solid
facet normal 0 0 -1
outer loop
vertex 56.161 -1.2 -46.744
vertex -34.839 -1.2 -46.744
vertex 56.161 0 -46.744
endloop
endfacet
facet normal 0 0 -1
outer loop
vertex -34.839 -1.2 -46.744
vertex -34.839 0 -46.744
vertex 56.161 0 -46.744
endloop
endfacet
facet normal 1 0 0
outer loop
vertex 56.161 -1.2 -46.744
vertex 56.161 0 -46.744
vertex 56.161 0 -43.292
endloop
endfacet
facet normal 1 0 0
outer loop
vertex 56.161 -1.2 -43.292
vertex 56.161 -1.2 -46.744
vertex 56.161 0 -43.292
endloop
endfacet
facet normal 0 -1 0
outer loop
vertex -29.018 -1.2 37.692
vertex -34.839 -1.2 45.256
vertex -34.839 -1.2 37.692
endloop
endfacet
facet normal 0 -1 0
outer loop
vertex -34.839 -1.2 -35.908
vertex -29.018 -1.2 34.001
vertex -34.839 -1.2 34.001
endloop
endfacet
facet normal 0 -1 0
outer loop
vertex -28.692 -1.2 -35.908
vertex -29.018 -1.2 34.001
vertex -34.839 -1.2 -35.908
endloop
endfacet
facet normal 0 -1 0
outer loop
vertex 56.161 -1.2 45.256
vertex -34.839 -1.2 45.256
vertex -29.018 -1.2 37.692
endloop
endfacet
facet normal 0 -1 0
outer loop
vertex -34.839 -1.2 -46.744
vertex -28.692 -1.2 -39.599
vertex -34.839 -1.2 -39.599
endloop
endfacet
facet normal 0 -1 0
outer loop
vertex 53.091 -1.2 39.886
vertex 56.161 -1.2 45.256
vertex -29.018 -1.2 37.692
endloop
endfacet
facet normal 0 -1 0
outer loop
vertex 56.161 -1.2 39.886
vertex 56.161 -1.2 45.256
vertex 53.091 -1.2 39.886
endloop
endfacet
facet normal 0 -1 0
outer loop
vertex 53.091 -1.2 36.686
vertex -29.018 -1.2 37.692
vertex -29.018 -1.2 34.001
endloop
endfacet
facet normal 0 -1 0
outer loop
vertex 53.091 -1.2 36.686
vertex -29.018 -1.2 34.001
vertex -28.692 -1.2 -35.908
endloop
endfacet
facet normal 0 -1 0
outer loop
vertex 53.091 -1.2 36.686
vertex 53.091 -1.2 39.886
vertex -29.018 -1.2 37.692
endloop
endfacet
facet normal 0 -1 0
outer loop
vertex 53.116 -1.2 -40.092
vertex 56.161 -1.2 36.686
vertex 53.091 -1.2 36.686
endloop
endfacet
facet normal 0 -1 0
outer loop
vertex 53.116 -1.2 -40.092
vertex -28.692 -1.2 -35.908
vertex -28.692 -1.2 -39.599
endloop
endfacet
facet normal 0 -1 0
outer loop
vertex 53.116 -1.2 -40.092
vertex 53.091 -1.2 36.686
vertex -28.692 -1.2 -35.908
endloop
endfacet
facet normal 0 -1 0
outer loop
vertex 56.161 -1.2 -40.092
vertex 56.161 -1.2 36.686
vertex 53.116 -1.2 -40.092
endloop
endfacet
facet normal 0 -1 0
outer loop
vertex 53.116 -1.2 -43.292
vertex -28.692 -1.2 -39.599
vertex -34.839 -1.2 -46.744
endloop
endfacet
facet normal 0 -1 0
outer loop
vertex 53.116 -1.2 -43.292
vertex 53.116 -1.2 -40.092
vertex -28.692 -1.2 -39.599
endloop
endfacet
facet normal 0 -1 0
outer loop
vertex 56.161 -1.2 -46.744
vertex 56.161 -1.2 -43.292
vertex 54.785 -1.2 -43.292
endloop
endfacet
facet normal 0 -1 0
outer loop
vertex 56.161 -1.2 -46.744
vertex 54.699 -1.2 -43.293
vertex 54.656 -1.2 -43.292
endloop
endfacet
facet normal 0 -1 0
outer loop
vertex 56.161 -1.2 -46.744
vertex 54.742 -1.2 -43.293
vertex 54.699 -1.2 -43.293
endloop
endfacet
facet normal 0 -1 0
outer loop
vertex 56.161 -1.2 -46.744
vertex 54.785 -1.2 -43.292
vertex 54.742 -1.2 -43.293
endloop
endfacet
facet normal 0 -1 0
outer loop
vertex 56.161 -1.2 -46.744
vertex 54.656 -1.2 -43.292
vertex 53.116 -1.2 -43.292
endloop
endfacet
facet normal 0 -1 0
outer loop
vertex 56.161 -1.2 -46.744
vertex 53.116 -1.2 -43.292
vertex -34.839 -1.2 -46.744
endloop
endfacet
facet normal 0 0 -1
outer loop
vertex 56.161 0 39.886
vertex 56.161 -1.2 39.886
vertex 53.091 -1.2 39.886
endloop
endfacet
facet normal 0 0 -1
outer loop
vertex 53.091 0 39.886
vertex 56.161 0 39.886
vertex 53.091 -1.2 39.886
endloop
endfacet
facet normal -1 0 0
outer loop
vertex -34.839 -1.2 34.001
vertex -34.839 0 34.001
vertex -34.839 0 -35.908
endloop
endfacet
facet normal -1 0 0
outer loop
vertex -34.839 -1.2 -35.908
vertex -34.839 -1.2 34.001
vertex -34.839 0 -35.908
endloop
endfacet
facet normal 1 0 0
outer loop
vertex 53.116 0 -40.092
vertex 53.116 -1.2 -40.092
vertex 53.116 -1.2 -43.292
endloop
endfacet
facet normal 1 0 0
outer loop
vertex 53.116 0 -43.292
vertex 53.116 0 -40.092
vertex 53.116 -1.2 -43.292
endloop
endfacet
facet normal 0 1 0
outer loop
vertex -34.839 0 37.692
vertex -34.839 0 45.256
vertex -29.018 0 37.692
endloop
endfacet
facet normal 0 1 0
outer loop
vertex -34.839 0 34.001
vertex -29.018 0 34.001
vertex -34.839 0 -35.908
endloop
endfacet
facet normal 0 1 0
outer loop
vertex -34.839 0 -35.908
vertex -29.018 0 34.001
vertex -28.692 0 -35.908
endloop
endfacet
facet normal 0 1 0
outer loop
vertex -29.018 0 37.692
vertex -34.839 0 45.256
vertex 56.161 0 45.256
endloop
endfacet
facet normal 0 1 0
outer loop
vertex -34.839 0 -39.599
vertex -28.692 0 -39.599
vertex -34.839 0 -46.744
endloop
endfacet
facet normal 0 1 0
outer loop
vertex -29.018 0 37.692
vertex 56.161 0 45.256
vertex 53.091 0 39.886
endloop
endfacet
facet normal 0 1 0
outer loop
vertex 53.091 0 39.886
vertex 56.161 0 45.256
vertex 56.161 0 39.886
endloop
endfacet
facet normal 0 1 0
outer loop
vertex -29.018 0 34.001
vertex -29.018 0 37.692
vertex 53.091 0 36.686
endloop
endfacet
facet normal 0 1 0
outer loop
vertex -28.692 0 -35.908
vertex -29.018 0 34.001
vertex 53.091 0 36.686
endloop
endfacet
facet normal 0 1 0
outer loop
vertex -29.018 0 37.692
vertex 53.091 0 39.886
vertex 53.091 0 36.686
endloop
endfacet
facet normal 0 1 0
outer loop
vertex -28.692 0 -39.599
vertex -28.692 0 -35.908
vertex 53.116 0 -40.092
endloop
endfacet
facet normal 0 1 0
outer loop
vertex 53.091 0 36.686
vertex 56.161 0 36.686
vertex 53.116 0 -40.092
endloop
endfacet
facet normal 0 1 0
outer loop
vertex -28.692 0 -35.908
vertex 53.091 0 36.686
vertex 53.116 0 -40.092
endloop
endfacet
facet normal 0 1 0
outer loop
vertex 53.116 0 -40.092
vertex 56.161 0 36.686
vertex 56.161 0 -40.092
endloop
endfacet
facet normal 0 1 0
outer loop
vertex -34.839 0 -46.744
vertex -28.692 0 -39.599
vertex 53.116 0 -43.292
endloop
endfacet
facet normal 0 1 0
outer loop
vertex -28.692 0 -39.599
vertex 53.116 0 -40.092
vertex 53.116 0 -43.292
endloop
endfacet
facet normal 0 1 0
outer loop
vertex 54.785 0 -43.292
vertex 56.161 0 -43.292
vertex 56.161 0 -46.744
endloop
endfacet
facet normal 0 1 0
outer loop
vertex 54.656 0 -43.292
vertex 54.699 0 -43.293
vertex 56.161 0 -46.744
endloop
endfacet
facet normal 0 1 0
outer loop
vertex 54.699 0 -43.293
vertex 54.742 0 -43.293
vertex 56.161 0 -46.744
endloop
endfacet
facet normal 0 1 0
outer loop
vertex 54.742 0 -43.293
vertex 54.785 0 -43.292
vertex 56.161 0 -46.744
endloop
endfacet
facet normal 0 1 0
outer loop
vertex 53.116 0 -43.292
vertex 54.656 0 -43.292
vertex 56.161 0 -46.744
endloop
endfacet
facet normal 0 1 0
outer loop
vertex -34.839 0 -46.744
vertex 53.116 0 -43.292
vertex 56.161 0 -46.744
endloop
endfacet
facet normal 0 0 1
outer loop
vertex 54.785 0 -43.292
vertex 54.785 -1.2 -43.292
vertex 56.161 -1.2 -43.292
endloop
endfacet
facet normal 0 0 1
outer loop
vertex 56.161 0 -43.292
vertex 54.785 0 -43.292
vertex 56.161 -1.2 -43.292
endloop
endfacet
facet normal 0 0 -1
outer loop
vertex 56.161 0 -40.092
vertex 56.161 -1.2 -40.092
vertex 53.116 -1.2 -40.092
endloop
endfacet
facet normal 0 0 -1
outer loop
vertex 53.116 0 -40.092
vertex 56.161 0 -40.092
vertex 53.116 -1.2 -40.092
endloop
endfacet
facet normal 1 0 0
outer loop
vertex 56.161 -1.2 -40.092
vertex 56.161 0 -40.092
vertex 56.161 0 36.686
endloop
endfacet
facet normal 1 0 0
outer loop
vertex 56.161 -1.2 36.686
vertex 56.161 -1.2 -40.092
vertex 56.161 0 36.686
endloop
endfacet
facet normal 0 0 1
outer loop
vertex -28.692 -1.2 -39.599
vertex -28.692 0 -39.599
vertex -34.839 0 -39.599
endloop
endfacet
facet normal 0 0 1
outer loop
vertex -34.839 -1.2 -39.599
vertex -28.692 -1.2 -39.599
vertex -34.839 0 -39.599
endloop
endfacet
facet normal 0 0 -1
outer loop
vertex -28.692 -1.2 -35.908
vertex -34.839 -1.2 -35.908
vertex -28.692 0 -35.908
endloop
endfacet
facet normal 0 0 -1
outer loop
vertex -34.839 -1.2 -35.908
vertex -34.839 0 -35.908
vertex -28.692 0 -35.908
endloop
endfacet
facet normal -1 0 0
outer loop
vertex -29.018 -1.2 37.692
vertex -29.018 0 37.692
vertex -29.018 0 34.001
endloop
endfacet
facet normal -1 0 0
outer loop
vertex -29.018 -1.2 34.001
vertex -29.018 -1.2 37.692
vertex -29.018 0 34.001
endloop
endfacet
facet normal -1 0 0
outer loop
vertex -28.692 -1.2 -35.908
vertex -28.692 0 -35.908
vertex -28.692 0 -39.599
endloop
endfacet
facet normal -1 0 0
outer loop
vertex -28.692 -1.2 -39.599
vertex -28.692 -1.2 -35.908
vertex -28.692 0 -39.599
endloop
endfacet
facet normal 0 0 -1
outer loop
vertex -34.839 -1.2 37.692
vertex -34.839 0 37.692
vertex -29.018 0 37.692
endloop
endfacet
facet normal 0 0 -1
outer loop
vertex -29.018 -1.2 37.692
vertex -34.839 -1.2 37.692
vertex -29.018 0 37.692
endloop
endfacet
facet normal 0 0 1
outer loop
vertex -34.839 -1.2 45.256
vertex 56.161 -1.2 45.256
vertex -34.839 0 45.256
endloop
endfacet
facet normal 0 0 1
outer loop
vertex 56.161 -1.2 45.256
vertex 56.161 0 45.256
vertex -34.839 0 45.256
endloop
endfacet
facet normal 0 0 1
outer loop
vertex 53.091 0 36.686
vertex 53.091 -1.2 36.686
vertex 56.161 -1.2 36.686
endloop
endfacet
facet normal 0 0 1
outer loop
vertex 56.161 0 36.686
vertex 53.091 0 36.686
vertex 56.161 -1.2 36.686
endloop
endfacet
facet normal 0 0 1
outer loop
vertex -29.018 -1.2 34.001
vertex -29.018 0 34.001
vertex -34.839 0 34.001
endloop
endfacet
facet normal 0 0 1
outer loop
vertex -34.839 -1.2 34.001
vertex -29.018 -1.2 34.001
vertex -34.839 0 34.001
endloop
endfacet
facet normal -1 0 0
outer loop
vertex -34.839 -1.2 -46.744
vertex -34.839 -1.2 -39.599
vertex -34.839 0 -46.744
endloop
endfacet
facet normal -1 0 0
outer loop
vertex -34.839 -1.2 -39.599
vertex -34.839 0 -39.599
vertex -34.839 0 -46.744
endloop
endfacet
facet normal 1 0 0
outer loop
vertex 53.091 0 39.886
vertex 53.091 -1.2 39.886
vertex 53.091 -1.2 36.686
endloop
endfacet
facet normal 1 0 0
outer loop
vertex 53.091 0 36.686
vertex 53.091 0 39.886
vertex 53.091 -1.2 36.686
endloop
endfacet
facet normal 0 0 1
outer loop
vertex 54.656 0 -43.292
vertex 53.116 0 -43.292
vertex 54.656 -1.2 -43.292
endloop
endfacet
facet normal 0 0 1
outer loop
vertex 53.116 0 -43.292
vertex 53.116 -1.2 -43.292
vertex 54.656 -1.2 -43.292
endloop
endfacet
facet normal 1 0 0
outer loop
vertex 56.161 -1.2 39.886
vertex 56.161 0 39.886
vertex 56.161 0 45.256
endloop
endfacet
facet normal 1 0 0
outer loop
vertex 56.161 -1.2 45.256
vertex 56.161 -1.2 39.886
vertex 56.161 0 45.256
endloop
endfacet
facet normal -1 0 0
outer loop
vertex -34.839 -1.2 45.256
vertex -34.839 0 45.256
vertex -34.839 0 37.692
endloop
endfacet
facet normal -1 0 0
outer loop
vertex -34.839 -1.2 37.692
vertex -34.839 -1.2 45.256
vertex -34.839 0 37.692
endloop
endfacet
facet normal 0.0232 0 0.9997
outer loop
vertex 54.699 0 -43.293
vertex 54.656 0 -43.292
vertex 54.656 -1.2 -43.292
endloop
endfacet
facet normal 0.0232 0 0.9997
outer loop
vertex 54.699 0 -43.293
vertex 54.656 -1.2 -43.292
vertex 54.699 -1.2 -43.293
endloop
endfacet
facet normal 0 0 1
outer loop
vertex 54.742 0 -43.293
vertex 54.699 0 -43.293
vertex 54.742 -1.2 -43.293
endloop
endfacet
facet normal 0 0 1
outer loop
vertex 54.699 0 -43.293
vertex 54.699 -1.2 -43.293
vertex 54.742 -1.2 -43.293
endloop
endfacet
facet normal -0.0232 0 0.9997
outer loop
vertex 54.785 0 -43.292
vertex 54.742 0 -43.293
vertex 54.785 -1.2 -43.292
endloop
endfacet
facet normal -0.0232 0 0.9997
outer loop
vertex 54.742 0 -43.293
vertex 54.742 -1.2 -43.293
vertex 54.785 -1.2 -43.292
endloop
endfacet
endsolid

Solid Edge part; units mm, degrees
sketch "Sketch1" plane through (12.1606, 0, 0.2565) normal (0, -1, 0) x (1, 0, 0)
  line L0 (-47, -47) -> (44, -47)
  line L1 (44, -47) -> (44, 45)
  line L2 (44, 45) -> (-47, 45)
  line L3 (-47, 45) -> (-47, -47)
  dimension "D1" = 91
  dimension "D2" = 92
extrude "ExtrudedProtrusion_1" add sketch "Sketch1" along normal blind 1.2
sketch "Sketch2" plane through (0, -1.2, 0) normal (0, -1, 0) x (1, 0, 0)
  circle A0 centre (-30.7894, -37.7535) radius 1.59
  circle A1 centre (54.6906, 38.2865) radius 1.59
  circle A2 centre (54.7206, -41.7035) radius 1.59
  circle A3 centre (-31.0894, 35.8465) radius 1.59
  dimension "D1" = 3.18
  dimension "D2" = 3.18
extrude "Cutout1" cut sketch "Sketch2" against normal up to next
sketch "Sketch3" plane through (10.6606, 0, -0.7435) normal (0, 1, 0) x (0, 0, 1)
  line L0 (-41.5487, 42.4559) -> (-42.5487, 42.4559)
  line L1 (-42.5487, 42.4559) -> (-42.5487, 45.6559)
  line L2 (-42.5487, 45.6559) -> (-39.3487, 45.6559)
  line L3 (-39.3487, 45.6559) -> (-39.3487, 42.4559)
  line L4 (-39.3487, 42.4559) -> (-41.5487, 42.4559)
  line L5 (38.43, 42.43) -> (37.43, 42.43)
  line L6 (37.43, 42.43) -> (37.43, 45.63)
  line L7 (37.43, 45.63) -> (40.63, 45.63)
  line L8 (40.63, 45.63) -> (40.63, 42.43)
  line L9 (40.63, 42.43) -> (38.43, 42.43)
extrude "Cutout2" cut sketch "Sketch3" along normal mid plane 9.1328
sketch "Sketch4" plane through (10.6606, -1.2, -0.7435) normal (0, -1, 0) x (0, 0, -1)
  line L0 (-38.4354, -45.7586) -> (-38.4354, -39.6788)
  line L1 (-38.4354, -39.6788) -> (-34.7446, -39.6788)
  line L2 (-34.7446, -39.6788) -> (-34.7446, -45.7586)
  line L3 (-38.4354, -45.7586) -> (-34.7446, -45.7586)
  line L4 (35.1646, -46.0285) -> (35.1646, -39.3522)
  line L5 (35.1646, -39.3522) -> (38.8554, -39.3522)
  line L6 (38.8554, -39.3522) -> (38.8554, -46.0285)
  line L7 (35.1646, -46.0285) -> (38.8554, -46.0285)
extrude "ExtrudedCutout_3" cut sketch "Sketch4" along normal mid plane 13.3866
properties material "Epoxy, cast rigid"
